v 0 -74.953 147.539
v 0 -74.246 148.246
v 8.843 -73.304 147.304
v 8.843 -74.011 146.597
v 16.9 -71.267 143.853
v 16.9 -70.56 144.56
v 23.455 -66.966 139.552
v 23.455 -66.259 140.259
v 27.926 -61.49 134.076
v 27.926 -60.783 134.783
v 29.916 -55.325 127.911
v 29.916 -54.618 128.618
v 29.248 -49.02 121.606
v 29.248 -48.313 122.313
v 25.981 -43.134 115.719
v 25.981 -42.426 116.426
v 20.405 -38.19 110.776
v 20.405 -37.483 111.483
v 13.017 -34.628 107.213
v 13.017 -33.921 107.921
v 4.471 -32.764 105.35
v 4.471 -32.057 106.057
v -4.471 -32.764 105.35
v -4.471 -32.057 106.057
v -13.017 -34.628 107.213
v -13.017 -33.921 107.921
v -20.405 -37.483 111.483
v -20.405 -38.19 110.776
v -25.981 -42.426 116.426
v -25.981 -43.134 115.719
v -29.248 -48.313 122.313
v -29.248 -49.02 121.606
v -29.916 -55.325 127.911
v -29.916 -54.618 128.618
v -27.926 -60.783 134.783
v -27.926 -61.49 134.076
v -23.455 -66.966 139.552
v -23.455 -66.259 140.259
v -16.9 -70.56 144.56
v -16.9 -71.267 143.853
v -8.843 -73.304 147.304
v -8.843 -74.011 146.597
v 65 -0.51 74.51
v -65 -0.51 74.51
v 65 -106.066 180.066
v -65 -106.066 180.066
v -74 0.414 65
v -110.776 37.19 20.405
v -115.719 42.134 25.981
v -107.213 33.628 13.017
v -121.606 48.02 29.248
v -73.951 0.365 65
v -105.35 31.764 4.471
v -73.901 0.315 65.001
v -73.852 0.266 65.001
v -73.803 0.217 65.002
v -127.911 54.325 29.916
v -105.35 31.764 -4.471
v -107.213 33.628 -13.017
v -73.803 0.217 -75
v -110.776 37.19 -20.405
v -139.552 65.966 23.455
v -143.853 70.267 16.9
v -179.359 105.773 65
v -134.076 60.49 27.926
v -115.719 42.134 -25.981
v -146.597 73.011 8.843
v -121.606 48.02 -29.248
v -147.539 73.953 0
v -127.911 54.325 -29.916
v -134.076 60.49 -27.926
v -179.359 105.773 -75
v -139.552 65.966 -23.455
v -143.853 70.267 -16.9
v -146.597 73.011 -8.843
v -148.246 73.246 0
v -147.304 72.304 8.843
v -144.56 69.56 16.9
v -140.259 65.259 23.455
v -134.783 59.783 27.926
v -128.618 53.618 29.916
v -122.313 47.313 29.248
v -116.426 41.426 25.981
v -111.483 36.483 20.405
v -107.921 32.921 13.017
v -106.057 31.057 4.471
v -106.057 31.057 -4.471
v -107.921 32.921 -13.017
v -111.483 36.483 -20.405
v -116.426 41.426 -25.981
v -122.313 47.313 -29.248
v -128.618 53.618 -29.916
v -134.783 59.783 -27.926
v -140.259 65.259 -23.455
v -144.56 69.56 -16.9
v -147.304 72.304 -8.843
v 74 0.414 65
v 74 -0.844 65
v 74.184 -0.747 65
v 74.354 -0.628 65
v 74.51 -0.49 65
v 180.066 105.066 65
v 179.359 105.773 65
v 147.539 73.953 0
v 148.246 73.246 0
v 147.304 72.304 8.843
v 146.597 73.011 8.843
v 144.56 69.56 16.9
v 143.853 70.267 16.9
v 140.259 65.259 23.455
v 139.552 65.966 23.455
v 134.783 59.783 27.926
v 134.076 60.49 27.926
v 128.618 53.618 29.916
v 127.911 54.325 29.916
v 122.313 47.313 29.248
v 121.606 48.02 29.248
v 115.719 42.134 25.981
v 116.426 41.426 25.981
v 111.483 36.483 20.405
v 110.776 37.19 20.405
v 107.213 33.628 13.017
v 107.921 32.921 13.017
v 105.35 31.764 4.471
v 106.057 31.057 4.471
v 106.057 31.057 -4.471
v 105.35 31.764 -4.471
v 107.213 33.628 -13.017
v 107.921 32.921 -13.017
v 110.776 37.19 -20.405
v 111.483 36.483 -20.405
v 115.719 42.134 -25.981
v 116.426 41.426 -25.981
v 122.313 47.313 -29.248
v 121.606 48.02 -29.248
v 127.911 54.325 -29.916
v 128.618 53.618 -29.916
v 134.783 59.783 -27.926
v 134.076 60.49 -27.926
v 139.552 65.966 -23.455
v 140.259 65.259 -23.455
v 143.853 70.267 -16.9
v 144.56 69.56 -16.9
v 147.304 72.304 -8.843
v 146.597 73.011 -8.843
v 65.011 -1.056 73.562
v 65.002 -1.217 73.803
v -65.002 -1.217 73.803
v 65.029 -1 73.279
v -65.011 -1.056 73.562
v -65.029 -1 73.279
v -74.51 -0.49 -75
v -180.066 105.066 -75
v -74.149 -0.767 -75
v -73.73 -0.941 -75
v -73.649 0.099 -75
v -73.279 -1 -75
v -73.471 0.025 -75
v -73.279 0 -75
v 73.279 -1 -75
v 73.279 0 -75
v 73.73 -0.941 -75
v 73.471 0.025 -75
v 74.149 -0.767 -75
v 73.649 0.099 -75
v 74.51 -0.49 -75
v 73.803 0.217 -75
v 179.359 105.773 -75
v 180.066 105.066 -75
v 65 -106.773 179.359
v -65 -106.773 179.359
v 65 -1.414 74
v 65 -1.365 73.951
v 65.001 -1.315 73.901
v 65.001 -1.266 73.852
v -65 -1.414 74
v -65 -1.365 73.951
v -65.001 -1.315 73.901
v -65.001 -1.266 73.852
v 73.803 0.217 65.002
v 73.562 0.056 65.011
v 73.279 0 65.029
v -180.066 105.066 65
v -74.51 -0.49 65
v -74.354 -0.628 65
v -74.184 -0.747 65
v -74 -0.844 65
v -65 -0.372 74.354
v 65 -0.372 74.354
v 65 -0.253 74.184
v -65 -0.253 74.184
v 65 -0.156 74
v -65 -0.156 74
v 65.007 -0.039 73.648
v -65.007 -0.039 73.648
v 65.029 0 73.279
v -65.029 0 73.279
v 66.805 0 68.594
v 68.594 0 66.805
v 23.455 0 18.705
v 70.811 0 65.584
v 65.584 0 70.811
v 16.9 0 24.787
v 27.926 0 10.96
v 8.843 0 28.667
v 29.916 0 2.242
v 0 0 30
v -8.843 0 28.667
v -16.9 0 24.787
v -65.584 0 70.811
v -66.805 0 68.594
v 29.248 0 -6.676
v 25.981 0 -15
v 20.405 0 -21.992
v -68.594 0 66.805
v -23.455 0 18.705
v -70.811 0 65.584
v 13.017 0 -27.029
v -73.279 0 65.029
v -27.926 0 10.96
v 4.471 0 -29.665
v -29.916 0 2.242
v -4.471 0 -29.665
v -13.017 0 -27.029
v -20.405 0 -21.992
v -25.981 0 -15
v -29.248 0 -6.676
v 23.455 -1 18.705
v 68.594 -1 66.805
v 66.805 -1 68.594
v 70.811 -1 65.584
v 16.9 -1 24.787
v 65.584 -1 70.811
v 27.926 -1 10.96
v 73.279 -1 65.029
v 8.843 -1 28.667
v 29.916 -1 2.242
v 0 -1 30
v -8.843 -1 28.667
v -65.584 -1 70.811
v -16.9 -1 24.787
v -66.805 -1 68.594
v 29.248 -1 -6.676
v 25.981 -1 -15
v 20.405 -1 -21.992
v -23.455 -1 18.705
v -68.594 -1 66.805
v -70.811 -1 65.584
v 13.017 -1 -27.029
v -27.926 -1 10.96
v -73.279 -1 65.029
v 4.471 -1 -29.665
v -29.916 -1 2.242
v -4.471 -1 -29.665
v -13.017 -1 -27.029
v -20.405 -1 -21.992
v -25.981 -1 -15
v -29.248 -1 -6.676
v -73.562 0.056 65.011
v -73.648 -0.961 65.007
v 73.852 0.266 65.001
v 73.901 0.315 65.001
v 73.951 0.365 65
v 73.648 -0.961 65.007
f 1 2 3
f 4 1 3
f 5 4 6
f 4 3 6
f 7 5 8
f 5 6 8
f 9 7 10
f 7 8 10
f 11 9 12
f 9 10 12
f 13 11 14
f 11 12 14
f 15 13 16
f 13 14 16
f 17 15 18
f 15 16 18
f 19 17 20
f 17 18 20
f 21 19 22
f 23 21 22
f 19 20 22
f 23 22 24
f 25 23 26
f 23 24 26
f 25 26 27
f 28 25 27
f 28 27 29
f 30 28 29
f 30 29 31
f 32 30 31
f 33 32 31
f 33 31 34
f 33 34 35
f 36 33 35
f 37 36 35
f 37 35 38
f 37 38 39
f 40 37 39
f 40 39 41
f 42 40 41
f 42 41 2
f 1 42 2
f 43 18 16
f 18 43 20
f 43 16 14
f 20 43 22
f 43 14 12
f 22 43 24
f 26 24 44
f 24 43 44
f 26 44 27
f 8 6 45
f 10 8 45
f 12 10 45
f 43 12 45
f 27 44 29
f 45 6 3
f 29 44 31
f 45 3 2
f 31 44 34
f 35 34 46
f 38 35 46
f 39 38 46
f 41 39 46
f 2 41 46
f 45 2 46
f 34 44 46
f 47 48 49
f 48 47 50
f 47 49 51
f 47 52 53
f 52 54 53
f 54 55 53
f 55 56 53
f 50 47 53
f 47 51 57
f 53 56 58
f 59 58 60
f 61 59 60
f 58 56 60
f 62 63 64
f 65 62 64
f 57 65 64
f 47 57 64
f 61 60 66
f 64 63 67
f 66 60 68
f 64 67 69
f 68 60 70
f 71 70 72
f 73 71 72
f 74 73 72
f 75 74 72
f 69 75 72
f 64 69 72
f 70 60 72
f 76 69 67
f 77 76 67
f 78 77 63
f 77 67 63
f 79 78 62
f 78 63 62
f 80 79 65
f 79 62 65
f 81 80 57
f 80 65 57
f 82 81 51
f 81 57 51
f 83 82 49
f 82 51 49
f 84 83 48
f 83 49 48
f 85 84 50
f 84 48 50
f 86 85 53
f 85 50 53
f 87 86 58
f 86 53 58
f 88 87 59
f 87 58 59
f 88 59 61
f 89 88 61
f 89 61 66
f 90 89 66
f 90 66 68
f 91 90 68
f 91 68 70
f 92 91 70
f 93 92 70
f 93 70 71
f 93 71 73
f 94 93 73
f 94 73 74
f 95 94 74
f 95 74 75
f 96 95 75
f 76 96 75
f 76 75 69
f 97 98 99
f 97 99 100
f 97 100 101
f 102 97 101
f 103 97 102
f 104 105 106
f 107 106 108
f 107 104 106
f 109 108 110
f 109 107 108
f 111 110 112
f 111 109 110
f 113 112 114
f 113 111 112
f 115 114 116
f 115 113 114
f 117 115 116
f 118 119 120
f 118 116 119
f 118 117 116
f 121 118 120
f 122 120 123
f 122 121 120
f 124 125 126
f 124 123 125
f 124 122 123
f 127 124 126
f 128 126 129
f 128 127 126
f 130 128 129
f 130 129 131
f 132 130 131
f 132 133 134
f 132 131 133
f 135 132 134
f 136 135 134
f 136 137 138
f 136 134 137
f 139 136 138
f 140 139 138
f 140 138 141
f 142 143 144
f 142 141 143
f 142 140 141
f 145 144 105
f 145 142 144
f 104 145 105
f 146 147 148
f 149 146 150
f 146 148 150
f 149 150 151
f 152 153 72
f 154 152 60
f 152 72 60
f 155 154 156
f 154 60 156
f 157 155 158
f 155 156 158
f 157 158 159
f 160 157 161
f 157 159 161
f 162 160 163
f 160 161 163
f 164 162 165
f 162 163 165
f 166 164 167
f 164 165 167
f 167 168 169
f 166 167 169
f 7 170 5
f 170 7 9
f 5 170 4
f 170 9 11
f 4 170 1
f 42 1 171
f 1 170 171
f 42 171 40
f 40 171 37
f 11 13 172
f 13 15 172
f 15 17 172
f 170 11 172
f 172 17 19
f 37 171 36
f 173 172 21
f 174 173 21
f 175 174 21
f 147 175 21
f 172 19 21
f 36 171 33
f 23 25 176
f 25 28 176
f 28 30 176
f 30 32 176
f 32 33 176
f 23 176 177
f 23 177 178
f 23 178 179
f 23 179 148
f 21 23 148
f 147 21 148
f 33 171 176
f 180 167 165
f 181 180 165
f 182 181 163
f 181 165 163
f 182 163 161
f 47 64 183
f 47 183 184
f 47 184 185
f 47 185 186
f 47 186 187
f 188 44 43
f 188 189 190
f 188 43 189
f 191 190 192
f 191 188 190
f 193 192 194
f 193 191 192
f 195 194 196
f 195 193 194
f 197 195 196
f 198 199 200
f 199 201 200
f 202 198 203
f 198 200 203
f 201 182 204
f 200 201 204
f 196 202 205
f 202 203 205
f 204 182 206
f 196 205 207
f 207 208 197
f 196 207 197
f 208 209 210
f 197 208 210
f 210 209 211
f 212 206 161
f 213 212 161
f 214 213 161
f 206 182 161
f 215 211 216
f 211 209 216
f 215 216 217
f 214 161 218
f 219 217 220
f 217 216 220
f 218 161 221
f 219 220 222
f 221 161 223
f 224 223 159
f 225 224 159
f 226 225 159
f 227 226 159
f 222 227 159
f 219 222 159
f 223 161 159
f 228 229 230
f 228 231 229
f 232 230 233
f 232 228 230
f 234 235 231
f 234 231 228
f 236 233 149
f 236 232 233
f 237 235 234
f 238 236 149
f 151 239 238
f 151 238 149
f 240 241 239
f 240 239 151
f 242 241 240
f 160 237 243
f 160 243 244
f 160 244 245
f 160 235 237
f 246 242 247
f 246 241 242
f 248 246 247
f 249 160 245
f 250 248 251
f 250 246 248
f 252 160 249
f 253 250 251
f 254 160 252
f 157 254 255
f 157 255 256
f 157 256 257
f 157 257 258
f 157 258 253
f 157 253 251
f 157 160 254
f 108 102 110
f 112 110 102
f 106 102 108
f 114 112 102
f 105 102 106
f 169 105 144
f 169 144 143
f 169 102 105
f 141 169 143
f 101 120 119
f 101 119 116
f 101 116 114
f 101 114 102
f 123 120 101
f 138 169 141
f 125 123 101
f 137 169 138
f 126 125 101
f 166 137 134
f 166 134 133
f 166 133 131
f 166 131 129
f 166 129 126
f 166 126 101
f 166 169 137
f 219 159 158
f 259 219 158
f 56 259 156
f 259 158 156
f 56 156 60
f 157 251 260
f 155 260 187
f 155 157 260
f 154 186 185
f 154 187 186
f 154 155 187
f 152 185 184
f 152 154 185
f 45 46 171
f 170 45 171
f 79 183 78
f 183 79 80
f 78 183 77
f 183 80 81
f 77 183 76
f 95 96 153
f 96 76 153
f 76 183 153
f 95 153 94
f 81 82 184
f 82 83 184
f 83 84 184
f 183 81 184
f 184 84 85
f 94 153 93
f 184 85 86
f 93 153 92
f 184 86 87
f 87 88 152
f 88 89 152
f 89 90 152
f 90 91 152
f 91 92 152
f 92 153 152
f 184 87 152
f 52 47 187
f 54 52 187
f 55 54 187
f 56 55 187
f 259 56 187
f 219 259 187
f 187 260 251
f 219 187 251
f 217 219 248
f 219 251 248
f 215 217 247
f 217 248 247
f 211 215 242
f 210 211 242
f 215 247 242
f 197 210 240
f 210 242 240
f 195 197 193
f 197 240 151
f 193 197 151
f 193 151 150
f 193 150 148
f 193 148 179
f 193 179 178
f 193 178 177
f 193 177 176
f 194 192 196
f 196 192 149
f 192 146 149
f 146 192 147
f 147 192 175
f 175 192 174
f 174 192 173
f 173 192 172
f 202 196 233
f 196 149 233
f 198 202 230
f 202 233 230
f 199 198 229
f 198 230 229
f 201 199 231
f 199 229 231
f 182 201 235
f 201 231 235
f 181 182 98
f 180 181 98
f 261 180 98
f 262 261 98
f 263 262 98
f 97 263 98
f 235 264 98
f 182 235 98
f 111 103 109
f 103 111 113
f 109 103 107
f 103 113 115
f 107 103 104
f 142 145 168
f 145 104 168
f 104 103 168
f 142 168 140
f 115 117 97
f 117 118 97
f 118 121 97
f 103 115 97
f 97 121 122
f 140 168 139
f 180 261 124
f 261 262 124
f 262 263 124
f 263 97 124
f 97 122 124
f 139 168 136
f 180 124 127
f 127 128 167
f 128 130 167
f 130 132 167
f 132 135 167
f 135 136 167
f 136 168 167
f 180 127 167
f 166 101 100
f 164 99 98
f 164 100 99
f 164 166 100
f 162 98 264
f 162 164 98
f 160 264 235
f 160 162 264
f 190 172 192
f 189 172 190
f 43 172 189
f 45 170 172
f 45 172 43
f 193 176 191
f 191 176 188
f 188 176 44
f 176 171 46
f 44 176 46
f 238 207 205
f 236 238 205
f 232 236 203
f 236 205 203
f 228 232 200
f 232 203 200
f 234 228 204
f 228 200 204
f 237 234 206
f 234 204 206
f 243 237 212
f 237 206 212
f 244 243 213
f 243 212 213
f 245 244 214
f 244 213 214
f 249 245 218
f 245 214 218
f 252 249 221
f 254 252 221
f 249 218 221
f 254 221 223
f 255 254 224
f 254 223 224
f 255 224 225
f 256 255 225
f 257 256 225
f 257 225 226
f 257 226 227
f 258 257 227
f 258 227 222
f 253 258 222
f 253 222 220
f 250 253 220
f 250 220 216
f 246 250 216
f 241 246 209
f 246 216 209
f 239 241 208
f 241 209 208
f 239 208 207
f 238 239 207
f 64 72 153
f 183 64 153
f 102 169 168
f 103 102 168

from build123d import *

# Parameters (mm, degrees)
SKETCH1_R            = 30
BASE_FLANGE1_DEPTH   = 1
EDGE_FLANGE1_START   = -75
EDGE_FLANGE1_DEPTH   = 140.5
EDGE_FLANGE1_START_2 = 65
EDGE_FLANGE1_2_DEPTH = 0.5
EDGE_FLANGE1_3_DEPTH = 140
SKETCH12_R           = 30
CUT_EXTRUDE1_DEPTH   = 10
EDGE_FLANGE2_START   = -65.5
EDGE_FLANGE2_DEPTH   = 131
EDGE_FLANGE2_2_DEPTH = 0.5
EDGE_FLANGE2_START_2 = 65
EDGE_FLANGE2_3_DEPTH = 0.5
EDGE_FLANGE2_START_3 = -65
EDGE_FLANGE2_4_DEPTH = 130
SKETCH16_R           = 30
CUT_EXTRUDE2_DEPTH   = 10
CUT_EXTRUDE3_DEPTH   = 10
FILLET2_R            = 9


# Read off the part's stored shape, not the designer's step: Edge-Flange1, Edge-Flange2
# Sheet-metal steps are written as plain solids
with BuildPart() as part:
    # Sketch1 → Base-Flange1 (new body)
    with BuildSketch(Plane(origin=(0, 0, 0), x_dir=(1, 0, 0), z_dir=(0, 1, 0))):
        with BuildLine():
            Line((-75, -65), (-75, 75))
            Line((-75, 75), (75, 75))
            Line((75, 75), (75, -65))
            ThreePointArc((75, -65), (72.071067812, -72.071067812), (65, -75))
            Line((65, -75), (-65, -75))
            ThreePointArc((-65, -75), (-72.071067812, -72.071067812), (-75, -65))
        make_face()
        with Locations(Location((0, 0, 0), (0, 0, 270))):
            Circle(SKETCH1_R, mode=Mode.SUBTRACT)
    extrude(amount=-BASE_FLANGE1_DEPTH)

    # Edge-Flange1 outline → Edge-Flange1 (cut)
    with BuildSketch(Plane.XY.offset(EDGE_FLANGE1_START)):
        with BuildLine():
            Line((-75, -1), (-73.279268401, -1))
            ThreePointArc((-73.279268401, -1), (-73.945137574, -0.867550387), (-74.509634201, -0.490365799))
            Line((-74.509634201, -0.490365799), (-75, 0))
            Line((-75, 0), (-75, -1))
        make_face()
        with BuildLine():
            ThreePointArc((74.509634201, -0.490365799), (73.945137574, -0.867550387), (73.279268401, -1))
            Line((73.279268401, -1), (75, -1))
            Line((75, -1), (75, 0))
            Line((75, 0), (74.509634201, -0.490365799))
        make_face()
    extrude(amount=EDGE_FLANGE1_DEPTH, mode=Mode.SUBTRACT)

    # Edge-Flange1 2 outline → Edge-Flange1 2 (cut)
    with BuildSketch(Plane.XY.offset(EDGE_FLANGE1_START_2)):
        with BuildLine():
            Line((-72.779268401, -1), (-72.779268401, 0))
            Line((-72.779268401, 0), (-75, 0))
            Line((-75, 0), (-74.509634201, -0.490365799))
            ThreePointArc((-74.509634201, -0.490365799), (-73.945137574, -0.867550387), (-73.279268401, -1))
            Line((-73.279268401, -1), (-72.779268401, -1))
        make_face()
        with BuildLine():
            Line((75, 0), (72.779268401, 0))
            Line((72.779268401, 0), (72.779268401, -1))
            Line((72.779268401, -1), (73.279268401, -1))
            ThreePointArc((73.279268401, -1), (73.945137574, -0.867550387), (74.509634201, -0.490365799))
            Line((74.509634201, -0.490365799), (75, 0))
        make_face()
    extrude(amount=EDGE_FLANGE1_2_DEPTH, mode=Mode.SUBTRACT)

    # Edge-Flange1 3 outline → Edge-Flange1 3 (add)
    with BuildSketch(Plane.XY.offset(EDGE_FLANGE1_START)):
        with BuildLine():
            Line((-75, 0), (-73.279268401, 0))
            ThreePointArc((-73.279268401, 0), (-73.562454141, 0.056329146), (-73.80252742, 0.216740982))
            Line((-73.80252742, 0.216740982), (-179.358910397, 105.773123959))
            Line((-179.358910397, 105.773123959), (-180.066017178, 105.066017178))
            Line((-180.066017178, 105.066017178), (-75, 0))
        make_face()
        with BuildLine():
            ThreePointArc((73.80252742, 0.216740982), (73.562454141, 0.056329146), (73.279268401, 0))
            Line((73.279268401, 0), (75, 0))
            Line((75, 0), (180.066017178, 105.066017178))
            Line((180.066017178, 105.066017178), (179.358910397, 105.773123959))
            Line((179.358910397, 105.773123959), (73.80252742, 0.216740982))
        make_face()
    extrude(amount=EDGE_FLANGE1_3_DEPTH)

    # Sketch12 → Cut-Extrude1 (cut)
    with BuildSketch(Plane(origin=(-36.792893219, -36.792893219, 0), x_dir=(0, 0, -1), z_dir=(0.7071067811865438, 0.7071067811865512, 0))):
        with Locations(Location((0, 126.618795027, 0), (0, 0, 90))):
            Circle(SKETCH12_R)
    cut_extrude1 = extrude(amount=-CUT_EXTRUDE1_DEPTH, mode=Mode.SUBTRACT)

    # Mirror1: Cut-Extrude1 across plane
    add(cut_extrude1.mirror(Plane(origin=(0, 0, 0), x_dir=(0, 0, 1), z_dir=(1, 0, 0))), mode=Mode.SUBTRACT)

    # Edge-Flange2 outline → Edge-Flange2 (cut)
    with BuildSketch(Plane.YZ.offset(EDGE_FLANGE2_START)):
        with BuildLine():
            ThreePointArc((-0.509634201, 74.509634201), (-0.132449613, 73.945137574), (0, 73.279268401))
            Line((0, 73.279268401), (0, 75))
            Line((0, 75), (-1, 75))
            Line((-1, 75), (-0.509634201, 74.509634201))
        make_face()
    extrude(amount=EDGE_FLANGE2_DEPTH, mode=Mode.SUBTRACT)

    # Edge-Flange2 2 outline → Edge-Flange2 2 (cut)
    with BuildSketch(Plane.YZ.offset(EDGE_FLANGE2_START)):
        with BuildLine():
            Line((-1, 72.779268401), (0, 72.779268401))
            Line((0, 72.779268401), (0, 73.279268401))
            ThreePointArc((0, 73.279268401), (-0.132449613, 73.945137574), (-0.509634201, 74.509634201))
            Line((-0.509634201, 74.509634201), (-1, 75))
            Line((-1, 75), (-1, 72.779268401))
        make_face()
    extrude(amount=EDGE_FLANGE2_2_DEPTH, mode=Mode.SUBTRACT)

    # Edge-Flange2 3 outline → Edge-Flange2 3 (cut)
    with BuildSketch(Plane.YZ.offset(EDGE_FLANGE2_START_2)):
        with BuildLine():
            Line((-1, 72.779268401), (0, 72.779268401))
            Line((0, 72.779268401), (0, 73.279268401))
            ThreePointArc((0, 73.279268401), (-0.132449613, 73.945137574), (-0.509634201, 74.509634201))
            Line((-0.509634201, 74.509634201), (-1, 75))
            Line((-1, 75), (-1, 72.779268401))
        make_face()
    extrude(amount=EDGE_FLANGE2_3_DEPTH, mode=Mode.SUBTRACT)

    # Edge-Flange2 4 outline → Edge-Flange2 4 (add)
    with BuildSketch(Plane.YZ.offset(EDGE_FLANGE2_START_3)):
        with BuildLine():
            ThreePointArc((-1.216740982, 73.80252742), (-1.056329146, 73.562454141), (-1, 73.279268401))
            Line((-1, 73.279268401), (-1, 75))
            Line((-1, 75), (-106.066017178, 180.066017178))
            Line((-106.066017178, 180.066017178), (-106.773123959, 179.358910397))
            Line((-106.773123959, 179.358910397), (-1.216740982, 73.80252742))
        make_face()
    extrude(amount=EDGE_FLANGE2_4_DEPTH)

    # Sketch16 → Cut-Extrude2 (cut)
    with BuildSketch(Plane(origin=(0, 37, 37), x_dir=(1, 0, 0), z_dir=(0, 0.7071067811865513, 0.7071067811865438))):
        with Locations(Location((0, -127.325901808, 0), (0, 0, 270))):
            Circle(SKETCH16_R)
    extrude(amount=-CUT_EXTRUDE2_DEPTH, mode=Mode.SUBTRACT)

    # Sketch17 → Cut-Extrude3 (cut)
    with BuildSketch(Plane(origin=(0, 0, 0), x_dir=(1, 0, 0), z_dir=(0, 1, 0))):
        Polygon((-72.779268401, -65), (-65, -65), (-65, -72.779268401), (-65.24665486, -73.060936269), (-65.339064279, -76.419683321), (-73.753182135, -79.834644684), (-76.575821569, -65.450165918), align=None)
    cut_extrude3 = extrude(amount=-CUT_EXTRUDE3_DEPTH, mode=Mode.SUBTRACT)

    # Mirror2: Cut-Extrude3 across plane
    add(cut_extrude3.mirror(Plane(origin=(0, 0, 0), x_dir=(0, 0, 1), z_dir=(1, 0, 0))), mode=Mode.SUBTRACT)

    # Fillet2
    fillet2_edges = [part.edges().sort_by_distance(p)[0] for p in [
        (-65, -0.5, 65),
    ]]
    fillet(fillet2_edges, radius=FILLET2_R)
    fillet2_2_edges = [part.edges().sort_by_distance(p)[0] for p in [
        (65, -0.5, 65),
    ]]
    fillet(fillet2_2_edges, radius=FILLET2_R)


solid = part.part
